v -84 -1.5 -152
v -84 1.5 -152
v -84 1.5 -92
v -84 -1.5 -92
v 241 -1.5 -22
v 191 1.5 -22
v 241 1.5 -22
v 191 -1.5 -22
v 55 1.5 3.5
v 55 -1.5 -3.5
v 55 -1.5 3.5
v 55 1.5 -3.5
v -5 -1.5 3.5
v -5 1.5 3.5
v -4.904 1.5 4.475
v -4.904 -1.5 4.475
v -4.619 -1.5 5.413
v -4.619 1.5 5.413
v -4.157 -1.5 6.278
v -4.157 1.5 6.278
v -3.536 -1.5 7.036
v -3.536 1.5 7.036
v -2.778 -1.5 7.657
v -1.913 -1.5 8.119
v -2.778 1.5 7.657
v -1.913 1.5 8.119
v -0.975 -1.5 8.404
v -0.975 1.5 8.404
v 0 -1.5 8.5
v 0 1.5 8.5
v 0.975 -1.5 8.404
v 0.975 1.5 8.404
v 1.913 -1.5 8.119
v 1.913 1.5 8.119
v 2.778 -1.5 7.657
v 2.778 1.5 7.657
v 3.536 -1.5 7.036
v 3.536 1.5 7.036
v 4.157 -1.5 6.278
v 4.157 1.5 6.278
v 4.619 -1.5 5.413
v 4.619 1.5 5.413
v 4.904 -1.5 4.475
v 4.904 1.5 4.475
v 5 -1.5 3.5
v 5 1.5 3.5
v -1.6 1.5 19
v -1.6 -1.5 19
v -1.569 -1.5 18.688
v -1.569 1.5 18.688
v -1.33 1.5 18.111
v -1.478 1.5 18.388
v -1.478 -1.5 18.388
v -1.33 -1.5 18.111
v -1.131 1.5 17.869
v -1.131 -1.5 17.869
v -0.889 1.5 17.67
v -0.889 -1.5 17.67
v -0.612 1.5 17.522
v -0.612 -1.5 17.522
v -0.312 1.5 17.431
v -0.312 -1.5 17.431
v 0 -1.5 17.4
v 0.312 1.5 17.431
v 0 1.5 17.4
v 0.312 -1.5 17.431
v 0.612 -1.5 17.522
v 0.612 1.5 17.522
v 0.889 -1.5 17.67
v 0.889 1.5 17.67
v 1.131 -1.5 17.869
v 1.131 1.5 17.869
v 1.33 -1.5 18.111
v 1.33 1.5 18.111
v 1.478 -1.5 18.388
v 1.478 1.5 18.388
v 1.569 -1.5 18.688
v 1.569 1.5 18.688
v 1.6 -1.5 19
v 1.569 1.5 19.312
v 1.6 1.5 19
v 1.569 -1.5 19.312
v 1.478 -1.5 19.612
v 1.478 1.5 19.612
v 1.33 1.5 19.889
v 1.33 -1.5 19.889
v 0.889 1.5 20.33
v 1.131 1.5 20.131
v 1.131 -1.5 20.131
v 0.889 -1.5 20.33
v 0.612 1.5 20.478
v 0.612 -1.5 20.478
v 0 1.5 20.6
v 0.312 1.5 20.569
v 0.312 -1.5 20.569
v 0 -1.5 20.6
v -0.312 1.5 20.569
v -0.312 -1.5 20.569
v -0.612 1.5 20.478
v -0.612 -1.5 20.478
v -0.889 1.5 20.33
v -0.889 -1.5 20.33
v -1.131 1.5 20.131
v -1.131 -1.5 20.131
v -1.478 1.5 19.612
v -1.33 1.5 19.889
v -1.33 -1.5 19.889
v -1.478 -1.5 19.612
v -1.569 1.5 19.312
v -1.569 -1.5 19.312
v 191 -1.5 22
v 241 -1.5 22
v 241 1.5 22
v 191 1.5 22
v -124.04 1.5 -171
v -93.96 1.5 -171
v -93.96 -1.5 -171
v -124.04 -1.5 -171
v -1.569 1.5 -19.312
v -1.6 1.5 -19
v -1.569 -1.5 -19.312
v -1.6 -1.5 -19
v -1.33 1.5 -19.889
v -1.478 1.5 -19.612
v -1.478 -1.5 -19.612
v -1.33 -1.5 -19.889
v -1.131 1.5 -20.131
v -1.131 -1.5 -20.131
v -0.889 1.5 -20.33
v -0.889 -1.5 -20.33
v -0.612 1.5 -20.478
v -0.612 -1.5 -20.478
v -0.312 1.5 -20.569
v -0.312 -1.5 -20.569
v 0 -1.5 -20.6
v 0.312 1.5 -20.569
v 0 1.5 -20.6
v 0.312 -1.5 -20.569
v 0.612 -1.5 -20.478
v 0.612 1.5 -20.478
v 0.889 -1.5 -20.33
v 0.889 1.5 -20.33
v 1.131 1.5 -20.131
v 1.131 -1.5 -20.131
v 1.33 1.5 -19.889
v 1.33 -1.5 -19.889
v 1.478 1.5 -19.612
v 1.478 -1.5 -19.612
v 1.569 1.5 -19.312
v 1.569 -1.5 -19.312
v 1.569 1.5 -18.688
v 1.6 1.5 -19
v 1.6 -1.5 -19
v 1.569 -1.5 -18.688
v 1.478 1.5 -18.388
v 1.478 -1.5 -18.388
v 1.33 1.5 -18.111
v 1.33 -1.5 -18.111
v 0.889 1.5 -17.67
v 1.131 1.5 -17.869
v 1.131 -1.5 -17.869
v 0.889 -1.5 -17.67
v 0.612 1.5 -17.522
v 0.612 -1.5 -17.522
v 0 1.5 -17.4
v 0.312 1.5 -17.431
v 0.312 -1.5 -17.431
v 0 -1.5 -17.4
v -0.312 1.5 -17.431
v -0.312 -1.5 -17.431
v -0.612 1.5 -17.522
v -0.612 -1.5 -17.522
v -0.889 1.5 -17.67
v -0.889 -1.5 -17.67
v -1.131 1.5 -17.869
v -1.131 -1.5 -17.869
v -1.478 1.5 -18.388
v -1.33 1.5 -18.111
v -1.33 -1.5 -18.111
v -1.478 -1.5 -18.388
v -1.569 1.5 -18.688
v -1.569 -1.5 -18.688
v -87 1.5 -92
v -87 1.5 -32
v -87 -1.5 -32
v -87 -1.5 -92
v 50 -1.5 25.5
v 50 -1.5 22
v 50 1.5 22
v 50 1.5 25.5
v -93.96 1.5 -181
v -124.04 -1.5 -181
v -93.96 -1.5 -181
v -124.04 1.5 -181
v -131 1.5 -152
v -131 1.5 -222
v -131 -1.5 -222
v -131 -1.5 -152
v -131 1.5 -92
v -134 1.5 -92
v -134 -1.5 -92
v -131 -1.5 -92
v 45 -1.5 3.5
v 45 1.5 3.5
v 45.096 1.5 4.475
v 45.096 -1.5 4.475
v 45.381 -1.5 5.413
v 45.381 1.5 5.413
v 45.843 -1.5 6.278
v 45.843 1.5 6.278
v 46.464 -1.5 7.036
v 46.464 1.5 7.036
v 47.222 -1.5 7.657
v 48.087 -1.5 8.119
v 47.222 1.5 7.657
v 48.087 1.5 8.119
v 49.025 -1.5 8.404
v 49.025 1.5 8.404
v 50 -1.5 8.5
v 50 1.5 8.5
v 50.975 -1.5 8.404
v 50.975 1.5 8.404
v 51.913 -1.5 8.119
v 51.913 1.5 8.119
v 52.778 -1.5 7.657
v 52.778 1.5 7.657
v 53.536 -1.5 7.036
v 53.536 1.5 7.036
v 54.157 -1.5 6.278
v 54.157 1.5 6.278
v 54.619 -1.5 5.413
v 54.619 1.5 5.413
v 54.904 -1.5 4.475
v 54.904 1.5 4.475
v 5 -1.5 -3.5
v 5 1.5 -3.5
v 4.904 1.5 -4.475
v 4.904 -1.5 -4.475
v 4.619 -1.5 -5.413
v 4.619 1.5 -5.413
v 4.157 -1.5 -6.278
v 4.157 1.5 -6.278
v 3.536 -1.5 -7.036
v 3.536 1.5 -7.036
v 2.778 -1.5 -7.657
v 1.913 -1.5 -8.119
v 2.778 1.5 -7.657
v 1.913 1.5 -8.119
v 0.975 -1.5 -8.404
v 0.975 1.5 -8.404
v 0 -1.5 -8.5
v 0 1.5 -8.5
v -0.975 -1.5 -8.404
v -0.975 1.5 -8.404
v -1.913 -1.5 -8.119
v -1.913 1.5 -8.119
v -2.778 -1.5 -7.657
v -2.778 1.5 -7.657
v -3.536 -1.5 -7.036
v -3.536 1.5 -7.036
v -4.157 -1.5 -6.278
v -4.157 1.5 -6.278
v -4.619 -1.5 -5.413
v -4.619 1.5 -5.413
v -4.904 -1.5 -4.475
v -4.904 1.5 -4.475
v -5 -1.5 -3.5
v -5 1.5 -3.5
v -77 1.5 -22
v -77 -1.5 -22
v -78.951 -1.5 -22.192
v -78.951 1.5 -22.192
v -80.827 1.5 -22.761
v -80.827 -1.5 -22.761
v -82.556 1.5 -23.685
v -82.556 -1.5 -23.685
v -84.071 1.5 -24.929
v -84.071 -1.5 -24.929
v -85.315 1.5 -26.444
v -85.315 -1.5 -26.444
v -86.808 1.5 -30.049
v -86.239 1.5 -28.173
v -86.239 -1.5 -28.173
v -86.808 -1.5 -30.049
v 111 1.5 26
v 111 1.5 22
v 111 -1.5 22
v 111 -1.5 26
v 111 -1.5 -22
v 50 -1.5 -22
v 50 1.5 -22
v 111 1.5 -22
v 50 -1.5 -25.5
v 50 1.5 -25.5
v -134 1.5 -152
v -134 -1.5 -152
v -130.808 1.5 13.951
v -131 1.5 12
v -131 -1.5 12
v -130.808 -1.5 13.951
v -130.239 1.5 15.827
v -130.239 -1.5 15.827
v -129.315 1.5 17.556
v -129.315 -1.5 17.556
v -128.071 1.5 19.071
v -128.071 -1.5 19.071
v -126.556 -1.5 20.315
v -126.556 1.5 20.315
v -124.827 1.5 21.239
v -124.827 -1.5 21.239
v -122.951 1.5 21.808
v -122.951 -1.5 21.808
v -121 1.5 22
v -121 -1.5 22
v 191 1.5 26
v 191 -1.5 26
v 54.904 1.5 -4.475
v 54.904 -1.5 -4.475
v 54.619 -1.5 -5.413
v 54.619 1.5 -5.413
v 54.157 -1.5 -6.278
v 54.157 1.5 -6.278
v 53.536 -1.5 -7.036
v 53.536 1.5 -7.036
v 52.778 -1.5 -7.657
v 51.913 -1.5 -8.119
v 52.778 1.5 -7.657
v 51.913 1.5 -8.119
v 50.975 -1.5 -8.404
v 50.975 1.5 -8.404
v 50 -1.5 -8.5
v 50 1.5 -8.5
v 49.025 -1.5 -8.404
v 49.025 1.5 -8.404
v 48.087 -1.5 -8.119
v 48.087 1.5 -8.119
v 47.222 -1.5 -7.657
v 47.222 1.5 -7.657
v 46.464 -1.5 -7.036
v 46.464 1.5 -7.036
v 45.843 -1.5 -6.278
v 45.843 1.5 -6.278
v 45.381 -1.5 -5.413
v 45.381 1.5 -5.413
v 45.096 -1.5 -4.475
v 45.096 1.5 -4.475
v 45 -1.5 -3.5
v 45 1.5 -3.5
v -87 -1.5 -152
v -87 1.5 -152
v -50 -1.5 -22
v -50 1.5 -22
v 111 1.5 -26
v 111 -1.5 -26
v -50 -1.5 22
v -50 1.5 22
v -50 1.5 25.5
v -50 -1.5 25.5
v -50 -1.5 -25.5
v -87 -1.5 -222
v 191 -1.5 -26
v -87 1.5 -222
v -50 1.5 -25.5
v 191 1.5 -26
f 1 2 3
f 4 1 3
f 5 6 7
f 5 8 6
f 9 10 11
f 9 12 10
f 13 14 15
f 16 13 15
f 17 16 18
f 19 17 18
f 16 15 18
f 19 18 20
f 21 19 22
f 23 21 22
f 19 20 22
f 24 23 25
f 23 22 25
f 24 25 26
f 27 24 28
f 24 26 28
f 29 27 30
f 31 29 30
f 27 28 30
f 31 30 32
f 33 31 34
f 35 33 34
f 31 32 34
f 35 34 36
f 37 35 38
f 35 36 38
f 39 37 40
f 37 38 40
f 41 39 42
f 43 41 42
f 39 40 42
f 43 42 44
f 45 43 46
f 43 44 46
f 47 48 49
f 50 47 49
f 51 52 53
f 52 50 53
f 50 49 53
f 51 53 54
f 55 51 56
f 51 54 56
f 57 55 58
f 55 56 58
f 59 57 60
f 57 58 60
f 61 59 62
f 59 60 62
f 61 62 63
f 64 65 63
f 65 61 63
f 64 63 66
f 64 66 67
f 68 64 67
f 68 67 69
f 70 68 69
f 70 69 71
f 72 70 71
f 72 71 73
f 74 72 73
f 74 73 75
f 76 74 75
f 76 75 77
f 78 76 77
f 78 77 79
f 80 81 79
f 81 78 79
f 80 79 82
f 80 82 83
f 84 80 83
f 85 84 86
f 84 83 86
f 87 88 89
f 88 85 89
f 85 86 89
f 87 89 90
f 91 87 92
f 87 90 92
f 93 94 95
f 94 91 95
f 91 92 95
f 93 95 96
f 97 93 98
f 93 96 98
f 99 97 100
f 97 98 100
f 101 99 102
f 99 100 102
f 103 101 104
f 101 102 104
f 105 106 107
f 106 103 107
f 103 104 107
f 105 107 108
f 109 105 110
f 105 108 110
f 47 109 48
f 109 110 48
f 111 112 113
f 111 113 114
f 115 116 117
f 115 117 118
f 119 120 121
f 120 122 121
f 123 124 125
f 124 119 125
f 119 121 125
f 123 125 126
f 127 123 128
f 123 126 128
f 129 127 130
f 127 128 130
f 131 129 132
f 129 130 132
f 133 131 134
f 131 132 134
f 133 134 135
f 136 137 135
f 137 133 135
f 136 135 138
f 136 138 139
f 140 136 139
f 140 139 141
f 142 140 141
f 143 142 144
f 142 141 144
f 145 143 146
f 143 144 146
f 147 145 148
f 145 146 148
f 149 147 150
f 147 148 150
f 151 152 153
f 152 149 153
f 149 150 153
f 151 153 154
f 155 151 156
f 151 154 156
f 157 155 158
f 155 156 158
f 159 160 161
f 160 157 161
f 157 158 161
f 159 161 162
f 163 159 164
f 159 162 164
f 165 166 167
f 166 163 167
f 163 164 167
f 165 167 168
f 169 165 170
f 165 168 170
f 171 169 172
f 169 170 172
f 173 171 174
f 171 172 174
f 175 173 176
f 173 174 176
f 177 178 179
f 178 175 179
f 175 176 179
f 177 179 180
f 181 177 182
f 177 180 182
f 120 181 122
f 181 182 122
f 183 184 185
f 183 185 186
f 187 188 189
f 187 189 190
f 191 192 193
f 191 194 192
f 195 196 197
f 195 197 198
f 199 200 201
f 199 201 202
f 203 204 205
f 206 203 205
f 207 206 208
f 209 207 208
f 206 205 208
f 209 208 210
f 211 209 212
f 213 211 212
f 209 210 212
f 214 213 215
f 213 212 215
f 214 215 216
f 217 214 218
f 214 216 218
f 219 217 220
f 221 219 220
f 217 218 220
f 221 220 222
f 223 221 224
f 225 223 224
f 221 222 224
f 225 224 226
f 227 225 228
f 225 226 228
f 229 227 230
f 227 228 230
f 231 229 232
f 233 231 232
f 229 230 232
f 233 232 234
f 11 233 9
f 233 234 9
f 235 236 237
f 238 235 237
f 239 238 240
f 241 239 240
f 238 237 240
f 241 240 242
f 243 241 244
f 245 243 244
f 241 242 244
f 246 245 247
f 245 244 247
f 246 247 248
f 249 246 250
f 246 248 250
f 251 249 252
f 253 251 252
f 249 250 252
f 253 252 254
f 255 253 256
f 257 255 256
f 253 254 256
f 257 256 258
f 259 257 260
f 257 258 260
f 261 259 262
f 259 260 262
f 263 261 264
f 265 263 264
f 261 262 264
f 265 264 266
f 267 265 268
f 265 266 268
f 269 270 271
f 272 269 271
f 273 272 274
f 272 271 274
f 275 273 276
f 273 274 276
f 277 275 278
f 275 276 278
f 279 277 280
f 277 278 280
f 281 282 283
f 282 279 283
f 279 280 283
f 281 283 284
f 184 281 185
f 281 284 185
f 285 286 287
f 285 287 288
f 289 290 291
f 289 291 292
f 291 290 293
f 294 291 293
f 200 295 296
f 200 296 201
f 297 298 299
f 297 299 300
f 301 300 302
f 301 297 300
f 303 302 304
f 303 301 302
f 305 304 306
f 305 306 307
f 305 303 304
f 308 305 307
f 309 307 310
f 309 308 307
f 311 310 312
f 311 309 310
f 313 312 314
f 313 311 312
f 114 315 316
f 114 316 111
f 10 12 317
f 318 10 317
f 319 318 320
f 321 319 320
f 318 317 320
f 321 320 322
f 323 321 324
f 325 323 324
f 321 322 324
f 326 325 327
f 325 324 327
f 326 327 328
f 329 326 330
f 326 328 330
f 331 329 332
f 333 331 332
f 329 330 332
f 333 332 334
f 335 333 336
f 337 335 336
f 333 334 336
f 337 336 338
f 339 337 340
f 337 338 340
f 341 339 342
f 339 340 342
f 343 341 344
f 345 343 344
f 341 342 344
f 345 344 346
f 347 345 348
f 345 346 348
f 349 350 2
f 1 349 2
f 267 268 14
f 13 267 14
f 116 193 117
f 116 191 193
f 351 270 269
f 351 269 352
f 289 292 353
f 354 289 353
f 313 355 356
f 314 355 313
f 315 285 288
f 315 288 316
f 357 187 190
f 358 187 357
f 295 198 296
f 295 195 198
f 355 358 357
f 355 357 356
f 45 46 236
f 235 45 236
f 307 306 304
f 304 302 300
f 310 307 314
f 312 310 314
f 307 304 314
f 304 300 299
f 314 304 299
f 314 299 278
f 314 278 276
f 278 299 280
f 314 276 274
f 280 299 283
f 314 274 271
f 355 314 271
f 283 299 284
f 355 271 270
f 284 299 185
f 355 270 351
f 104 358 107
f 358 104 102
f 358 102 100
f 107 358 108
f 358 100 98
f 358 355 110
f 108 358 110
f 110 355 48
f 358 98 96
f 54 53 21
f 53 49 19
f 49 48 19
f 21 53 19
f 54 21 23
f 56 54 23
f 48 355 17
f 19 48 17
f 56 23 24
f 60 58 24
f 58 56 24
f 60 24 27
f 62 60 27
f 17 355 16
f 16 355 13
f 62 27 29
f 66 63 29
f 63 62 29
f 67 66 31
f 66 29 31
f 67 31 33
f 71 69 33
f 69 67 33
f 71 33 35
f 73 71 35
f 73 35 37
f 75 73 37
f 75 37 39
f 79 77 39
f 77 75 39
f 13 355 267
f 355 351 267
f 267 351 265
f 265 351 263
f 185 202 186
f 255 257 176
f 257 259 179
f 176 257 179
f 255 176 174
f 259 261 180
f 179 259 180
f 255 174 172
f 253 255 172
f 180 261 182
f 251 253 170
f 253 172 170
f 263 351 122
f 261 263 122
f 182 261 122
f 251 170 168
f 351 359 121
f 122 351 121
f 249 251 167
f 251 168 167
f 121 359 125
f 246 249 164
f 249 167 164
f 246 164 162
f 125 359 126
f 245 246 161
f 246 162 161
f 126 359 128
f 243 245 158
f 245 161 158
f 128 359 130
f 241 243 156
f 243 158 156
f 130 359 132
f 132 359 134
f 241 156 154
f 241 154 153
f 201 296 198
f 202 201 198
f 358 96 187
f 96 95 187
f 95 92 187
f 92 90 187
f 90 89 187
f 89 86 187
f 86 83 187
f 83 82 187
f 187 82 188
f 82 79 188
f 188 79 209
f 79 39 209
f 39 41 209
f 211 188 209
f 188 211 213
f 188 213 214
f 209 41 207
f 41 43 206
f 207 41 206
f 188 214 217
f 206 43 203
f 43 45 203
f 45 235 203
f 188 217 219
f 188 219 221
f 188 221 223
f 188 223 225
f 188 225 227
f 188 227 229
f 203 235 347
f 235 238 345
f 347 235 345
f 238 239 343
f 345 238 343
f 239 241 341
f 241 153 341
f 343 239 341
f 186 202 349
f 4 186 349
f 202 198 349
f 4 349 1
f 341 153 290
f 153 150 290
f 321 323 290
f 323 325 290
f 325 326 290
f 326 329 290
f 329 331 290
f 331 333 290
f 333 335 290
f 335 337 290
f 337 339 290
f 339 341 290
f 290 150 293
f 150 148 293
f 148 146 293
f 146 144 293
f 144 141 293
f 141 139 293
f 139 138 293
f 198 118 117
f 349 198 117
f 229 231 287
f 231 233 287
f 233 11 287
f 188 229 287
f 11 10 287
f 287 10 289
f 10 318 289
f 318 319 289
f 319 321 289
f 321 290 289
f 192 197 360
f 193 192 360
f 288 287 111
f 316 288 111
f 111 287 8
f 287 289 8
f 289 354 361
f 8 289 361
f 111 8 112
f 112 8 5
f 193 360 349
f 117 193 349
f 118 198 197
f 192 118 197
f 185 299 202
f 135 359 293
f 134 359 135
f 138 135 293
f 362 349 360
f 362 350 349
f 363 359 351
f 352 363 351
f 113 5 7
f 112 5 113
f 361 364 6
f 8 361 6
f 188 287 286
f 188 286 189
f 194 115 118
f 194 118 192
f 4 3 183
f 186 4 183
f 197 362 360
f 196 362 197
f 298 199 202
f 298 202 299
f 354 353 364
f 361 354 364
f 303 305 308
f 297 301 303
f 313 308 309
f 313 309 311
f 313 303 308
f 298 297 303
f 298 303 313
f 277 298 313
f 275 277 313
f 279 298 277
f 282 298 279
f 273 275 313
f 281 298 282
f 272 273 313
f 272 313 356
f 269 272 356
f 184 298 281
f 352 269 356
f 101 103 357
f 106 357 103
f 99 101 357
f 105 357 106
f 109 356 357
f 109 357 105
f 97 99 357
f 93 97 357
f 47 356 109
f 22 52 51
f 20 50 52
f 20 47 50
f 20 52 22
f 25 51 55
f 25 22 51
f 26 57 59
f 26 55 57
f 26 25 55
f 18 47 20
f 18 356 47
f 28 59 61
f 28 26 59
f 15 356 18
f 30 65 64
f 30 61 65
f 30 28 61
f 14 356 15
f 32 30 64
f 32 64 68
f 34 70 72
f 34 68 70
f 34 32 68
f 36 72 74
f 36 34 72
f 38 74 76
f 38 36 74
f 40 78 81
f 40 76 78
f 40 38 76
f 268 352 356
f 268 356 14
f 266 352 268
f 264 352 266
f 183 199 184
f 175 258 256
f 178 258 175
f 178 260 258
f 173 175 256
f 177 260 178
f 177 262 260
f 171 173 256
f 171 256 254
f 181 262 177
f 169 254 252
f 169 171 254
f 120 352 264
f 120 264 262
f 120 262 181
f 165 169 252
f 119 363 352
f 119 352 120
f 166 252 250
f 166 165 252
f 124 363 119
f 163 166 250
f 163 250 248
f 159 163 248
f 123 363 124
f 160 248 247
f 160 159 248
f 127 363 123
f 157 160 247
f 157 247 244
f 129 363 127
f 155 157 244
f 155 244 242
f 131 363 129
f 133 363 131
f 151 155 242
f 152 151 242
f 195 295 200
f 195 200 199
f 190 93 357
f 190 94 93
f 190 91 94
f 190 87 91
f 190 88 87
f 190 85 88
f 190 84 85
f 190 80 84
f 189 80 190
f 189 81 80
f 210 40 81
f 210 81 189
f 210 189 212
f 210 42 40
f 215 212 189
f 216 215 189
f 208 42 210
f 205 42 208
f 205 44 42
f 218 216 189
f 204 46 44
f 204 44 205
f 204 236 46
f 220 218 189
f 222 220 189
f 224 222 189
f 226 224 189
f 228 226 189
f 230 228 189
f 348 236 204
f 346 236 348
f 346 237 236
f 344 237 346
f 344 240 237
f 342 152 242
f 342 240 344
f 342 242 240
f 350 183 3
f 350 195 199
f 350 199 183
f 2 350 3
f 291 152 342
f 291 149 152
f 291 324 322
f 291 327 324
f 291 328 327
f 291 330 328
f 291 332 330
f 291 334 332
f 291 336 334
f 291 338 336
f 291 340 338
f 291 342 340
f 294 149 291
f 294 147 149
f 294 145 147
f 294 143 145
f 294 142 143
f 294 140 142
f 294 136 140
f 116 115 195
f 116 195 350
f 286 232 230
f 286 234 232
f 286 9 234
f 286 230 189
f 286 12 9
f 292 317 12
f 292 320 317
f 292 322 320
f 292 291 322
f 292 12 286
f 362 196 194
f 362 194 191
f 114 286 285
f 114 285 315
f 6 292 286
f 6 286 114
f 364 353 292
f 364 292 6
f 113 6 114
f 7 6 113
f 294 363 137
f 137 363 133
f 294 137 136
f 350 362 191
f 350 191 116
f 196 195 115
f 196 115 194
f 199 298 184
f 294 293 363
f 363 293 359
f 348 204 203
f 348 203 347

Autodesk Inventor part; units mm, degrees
ref_plane "YZ Plane" through (0, 0, 0) normal (1, 0, 0) x (0, 1, 0)
ref_plane "XZ Plane" through (0, 0, 0) normal (0, 1, 0) x (-1, 0, 0)
ref_plane "XY Plane" through (0, 0, 0) normal (0, 0, 1) x (1, 0, 0)
sketch "Sketch6" plane through (0, 1.5, 0) normal (0, 1, 0) x (1, 0, 0)
  line L0 (-131, 222) -> (-131, -12)
  line L1 (-131, 152) -> (-134, 152)
  line L2 (-134, 152) -> (-134, 92)
  line L3 (-134, 92) -> (-131, 92)
  line L4 (-131, 92) -> (-131, 152)
  line L5 (-87, 222) -> (-131, 222)
  line L6 (-109, 222) -> (-109, 171)
  line L7 (-124.04, 171) -> (-93.96, 171)
  line L8 (-87, 152) -> (-84, 152)
  line L9 (-84, 152) -> (-84, 92)
  line L10 (-84, 92) -> (-87, 92)
  line L11 (-87, 92) -> (-87, 152)
  point P0 (0, 0)
  point P1 (-134, 122)
  point P2 (-84, 122)
  dimension "d38" = 3
  dimension "d39" = 60
  dimension "d40" = 100
sketch "Sketch1" plane through (0, 0, 0) normal (0, 1, 0) x (-1, 0, 0)
  line L0 (-241, 22) -> (241, 22)
  line L1 (241, 22) -> (241, -22)
  line L2 (241, -22) -> (-241, -22)
  line L3 (-241, -22) -> (-241, 22)
  line L4 (-241, 22) -> (241, -22) construction
  line L5 (241, 22) -> (-241, -22) construction
  line L6 (50, -22) -> (-50, -22)
  line L7 (-50, -22) -> (-50, -25.5)
  line L8 (-50, -25.5) -> (50, -25.5)
  line L9 (50, -25.5) -> (50, -22)
  line L10 (50, -22) -> (-50, -25.5) construction
  line L11 (-50, -22) -> (50, -25.5) construction
  line L12 (241, 0) -> (-241, 0)
  line L13 (50, 22) -> (-50, 22)
  line L14 (-50, 22) -> (-50, 25.5)
  line L15 (-50, 25.5) -> (50, 25.5)
  line L16 (50, 25.5) -> (50, 22)
  line L17 (50, 22) -> (-50, 25.5) construction
  line L18 (-50, 22) -> (50, 25.5) construction
  line L19 (121, 15) -> (115.8, 15)
  line L20 (115.8, 15) -> (115.8, -15)
  line L21 (115.8, -15) -> (121, -15)
  line L22 (121, -15) -> (121, 15)
  line L23 (121, 15) -> (115.8, -15) construction
  line L24 (115.8, 15) -> (121, -15) construction
  circle A0 centre (0, -19) radius 1.6
  circle A1 centre (0, 19) radius 1.6
  line L25 (131, -22) -> (131, 22)
  point P0 (0, 0)
  point P1 (0, -23.75)
  point P2 (0, -22)
  point P3 (0, 23.75)
  point P4 (0, 22)
  point P5 (50, -22)
  point P6 (50, 22)
  point P7 (-50, 22)
  point P8 (-50, -22)
  point P9 (118.4, 0)
  point P10 (0, 0)
  dimension "d0" = 482
  dimension "d1" = 44
  dimension "d2" = 100
  dimension "d3" = 3.5
  dimension "d5" = 5.2
  dimension "d6" = 30
  dimension "d8" = 3.2
  dimension "d9" = 38
  dimension "d23" = 10
  dimension "d24" = 110
extrude "Plate1" add sketch "Sketch1" along normal mid plane 3 contours L0 L25 L12 L22 L19 L20 L3 | L14 L15 L16 L0 | L12 L20 L21 L22 L25 L2 L3 | L20 L19 L22 L12 | L12 L22 L21 L20 | L2 L9 L8 L7
sketch "Sketch2" plane through (0, 1.5, 0) normal (0, 1, 0) x (1, 0, 0)
  line L0 (0, -3.5) -> (0, 3.5) construction
  line L1 (5, -3.5) -> (5, 3.5)
  line L2 (-5, 3.5) -> (-5, -3.5)
  arc A0 (-5, -3.5) -> (5, -3.5) centre (0, -3.5) ccw
  arc A1 (5, 3.5) -> (-5, 3.5) centre (0, 3.5) ccw
  line L3 (-50, -25.5) -> (50, -25.5) projected
  line L4 (25, -25.5) -> (25, 25.5)
  line L5 (50, 25.5) -> (-50, 25.5) projected
  circle A2 centre (0, -19) radius 1.6 projected
  line L6 (50, -3.5) -> (50, 3.5) construction
  line L7 (45, -3.5) -> (45, 3.5)
  line L8 (55, 3.5) -> (55, -3.5)
  arc A3 (45, -3.5) -> (55, -3.5) centre (50, -3.5) ccw
  arc A4 (55, 3.5) -> (45, 3.5) centre (50, 3.5) ccw
  point P0 (0, 0)
  point P1 (0, 8.5)
  point P2 (0, -8.5)
  point P3 (50, 0)
  point P4 (50, 8.5)
  point P5 (50, -8.5)
  dimension "d10" = 17
  dimension "d11" = 5
  dimension "d12" = 25
extrude "Cut1" cut sketch "Sketch2" against normal blind 3 contours A0 L2 A1 L1 | L7 A4 L8 A3
sketch "Sketch3" plane through (0, 1.5, 0) normal (0, 1, 0) x (1, 0, 0)
  line L0 (-50, -25.5) -> (50, -25.5)
  line L1 (0, -25.5) -> (0, 25.5)
  line L2 (50, 25.5) -> (-50, 25.5)
  line L3 (-241, 0) -> (241, 0)
  line L4 (241, -22) -> (241, 22)
  line L5 (50, 22) -> (-50, 22)
  line L6 (191, 22) -> (111, 22)
  line L7 (111, 22) -> (111, 26)
  line L8 (111, 26) -> (191, 26)
  line L9 (191, 26) -> (191, 22)
  line L10 (191, -26) -> (191, -22)
  line L11 (191, -22) -> (111, -22)
  line L12 (111, -22) -> (111, -26)
  line L13 (111, -26) -> (191, -26)
  point P0 (0, 0)
  point P1 (151, 22)
  point P2 (151, -22)
sheet face with bend "Face2" sketch "Sketch3" thickness 3 toward (0, -1, 0) bend radius 3
bend "Bend1"
sketch "Sketch4" plane through (0, 1.5, 0) normal (0, 1, 0) x (1, 0, 0)
  line L0 (-50, 22) -> (-131, 22)
  line L1 (-131, 22) -> (-87, 22)
  line L2 (-87, 22) -> (-87, 222)
  line L3 (-87, 222) -> (-131, 222)
  line L4 (-131, 222) -> (-131, 22)
  point P0 (0, 0)
  dimension "d25" = 44
  dimension "d26" = 200
sheet face with bend "Face3" sketch "Sketch4" thickness 3 toward (0, -1, 0) bend radius 3
bend "Bend2"
fillet "Corner Round1" radius 10 2 edges at (-87, 0, -22) (-131, 0, 22)
sketch "Sketch5" plane through (0, 1.5, 0) normal (0, 1, 0) x (1, 0, 0)
  line L0 (-124.04, 181) -> (-93.96, 181)
  line L1 (-93.96, 181) -> (-93.96, 171)
  line L2 (-93.96, 171) -> (-124.04, 171)
  line L3 (-124.04, 171) -> (-124.04, 181)
  line L4 (-87, 222) -> (-131, 222) projected
  point P0 (0, 0)
  point P1 (-109, 222)
  point P2 (-109, 181)
  dimension "d33" = 41
  dimension "d34" = 10
  dimension "d35" = 30.08
extrude "Cut2" cut sketch "Sketch5" against normal blind 3
sheet face with bend "Face4" sketch "Sketch6" thickness 3 toward (0, -1, 0) bend radius 3
bend "Bend3"
equation "\"d13\" = Thickness"
equation "\"d36\" = Thickness"
equation "\"d4\" = Thickness"
equation "\"d18\" = BendRadius"
equation "\"d19\" = BendReliefWidth"
equation "\"d21\" = MinimumRemnant"
equation "\"d20\" = BendReliefDepth"
equation "\"d22\" = TransitionRadius"
equation "\"d27\" = BendRadius"
equation "\"d28\" = BendReliefWidth"
equation "\"d30\" = MinimumRemnant"
equation "\"d29\" = BendReliefDepth"
equation "\"d31\" = TransitionRadius"
equation "\"d41\" = BendRadius"
equation "\"d42\" = BendReliefWidth"
equation "\"d44\" = MinimumRemnant"
equation "\"d43\" = BendReliefDepth"
equation "\"d45\" = TransitionRadius"
equation "\"BendRadius\" = Thickness"
equation "\"BendReliefWidth\" = Thickness"
equation "\"BendReliefDepth\" = 0.5 * Thickness"
equation "\"CornerReliefSize\" = 4 * Thickness"
equation "\"MinimumRemnant\" = 2 * Thickness"
equation "\"TransitionRadius\" = BendRadius"
equation "\"JacobiRadiusSize\" = BendRadius"
equation "\"GapSize\" = Thickness"
equation "\"Thickness\" = 3"
properties part number "Path"
